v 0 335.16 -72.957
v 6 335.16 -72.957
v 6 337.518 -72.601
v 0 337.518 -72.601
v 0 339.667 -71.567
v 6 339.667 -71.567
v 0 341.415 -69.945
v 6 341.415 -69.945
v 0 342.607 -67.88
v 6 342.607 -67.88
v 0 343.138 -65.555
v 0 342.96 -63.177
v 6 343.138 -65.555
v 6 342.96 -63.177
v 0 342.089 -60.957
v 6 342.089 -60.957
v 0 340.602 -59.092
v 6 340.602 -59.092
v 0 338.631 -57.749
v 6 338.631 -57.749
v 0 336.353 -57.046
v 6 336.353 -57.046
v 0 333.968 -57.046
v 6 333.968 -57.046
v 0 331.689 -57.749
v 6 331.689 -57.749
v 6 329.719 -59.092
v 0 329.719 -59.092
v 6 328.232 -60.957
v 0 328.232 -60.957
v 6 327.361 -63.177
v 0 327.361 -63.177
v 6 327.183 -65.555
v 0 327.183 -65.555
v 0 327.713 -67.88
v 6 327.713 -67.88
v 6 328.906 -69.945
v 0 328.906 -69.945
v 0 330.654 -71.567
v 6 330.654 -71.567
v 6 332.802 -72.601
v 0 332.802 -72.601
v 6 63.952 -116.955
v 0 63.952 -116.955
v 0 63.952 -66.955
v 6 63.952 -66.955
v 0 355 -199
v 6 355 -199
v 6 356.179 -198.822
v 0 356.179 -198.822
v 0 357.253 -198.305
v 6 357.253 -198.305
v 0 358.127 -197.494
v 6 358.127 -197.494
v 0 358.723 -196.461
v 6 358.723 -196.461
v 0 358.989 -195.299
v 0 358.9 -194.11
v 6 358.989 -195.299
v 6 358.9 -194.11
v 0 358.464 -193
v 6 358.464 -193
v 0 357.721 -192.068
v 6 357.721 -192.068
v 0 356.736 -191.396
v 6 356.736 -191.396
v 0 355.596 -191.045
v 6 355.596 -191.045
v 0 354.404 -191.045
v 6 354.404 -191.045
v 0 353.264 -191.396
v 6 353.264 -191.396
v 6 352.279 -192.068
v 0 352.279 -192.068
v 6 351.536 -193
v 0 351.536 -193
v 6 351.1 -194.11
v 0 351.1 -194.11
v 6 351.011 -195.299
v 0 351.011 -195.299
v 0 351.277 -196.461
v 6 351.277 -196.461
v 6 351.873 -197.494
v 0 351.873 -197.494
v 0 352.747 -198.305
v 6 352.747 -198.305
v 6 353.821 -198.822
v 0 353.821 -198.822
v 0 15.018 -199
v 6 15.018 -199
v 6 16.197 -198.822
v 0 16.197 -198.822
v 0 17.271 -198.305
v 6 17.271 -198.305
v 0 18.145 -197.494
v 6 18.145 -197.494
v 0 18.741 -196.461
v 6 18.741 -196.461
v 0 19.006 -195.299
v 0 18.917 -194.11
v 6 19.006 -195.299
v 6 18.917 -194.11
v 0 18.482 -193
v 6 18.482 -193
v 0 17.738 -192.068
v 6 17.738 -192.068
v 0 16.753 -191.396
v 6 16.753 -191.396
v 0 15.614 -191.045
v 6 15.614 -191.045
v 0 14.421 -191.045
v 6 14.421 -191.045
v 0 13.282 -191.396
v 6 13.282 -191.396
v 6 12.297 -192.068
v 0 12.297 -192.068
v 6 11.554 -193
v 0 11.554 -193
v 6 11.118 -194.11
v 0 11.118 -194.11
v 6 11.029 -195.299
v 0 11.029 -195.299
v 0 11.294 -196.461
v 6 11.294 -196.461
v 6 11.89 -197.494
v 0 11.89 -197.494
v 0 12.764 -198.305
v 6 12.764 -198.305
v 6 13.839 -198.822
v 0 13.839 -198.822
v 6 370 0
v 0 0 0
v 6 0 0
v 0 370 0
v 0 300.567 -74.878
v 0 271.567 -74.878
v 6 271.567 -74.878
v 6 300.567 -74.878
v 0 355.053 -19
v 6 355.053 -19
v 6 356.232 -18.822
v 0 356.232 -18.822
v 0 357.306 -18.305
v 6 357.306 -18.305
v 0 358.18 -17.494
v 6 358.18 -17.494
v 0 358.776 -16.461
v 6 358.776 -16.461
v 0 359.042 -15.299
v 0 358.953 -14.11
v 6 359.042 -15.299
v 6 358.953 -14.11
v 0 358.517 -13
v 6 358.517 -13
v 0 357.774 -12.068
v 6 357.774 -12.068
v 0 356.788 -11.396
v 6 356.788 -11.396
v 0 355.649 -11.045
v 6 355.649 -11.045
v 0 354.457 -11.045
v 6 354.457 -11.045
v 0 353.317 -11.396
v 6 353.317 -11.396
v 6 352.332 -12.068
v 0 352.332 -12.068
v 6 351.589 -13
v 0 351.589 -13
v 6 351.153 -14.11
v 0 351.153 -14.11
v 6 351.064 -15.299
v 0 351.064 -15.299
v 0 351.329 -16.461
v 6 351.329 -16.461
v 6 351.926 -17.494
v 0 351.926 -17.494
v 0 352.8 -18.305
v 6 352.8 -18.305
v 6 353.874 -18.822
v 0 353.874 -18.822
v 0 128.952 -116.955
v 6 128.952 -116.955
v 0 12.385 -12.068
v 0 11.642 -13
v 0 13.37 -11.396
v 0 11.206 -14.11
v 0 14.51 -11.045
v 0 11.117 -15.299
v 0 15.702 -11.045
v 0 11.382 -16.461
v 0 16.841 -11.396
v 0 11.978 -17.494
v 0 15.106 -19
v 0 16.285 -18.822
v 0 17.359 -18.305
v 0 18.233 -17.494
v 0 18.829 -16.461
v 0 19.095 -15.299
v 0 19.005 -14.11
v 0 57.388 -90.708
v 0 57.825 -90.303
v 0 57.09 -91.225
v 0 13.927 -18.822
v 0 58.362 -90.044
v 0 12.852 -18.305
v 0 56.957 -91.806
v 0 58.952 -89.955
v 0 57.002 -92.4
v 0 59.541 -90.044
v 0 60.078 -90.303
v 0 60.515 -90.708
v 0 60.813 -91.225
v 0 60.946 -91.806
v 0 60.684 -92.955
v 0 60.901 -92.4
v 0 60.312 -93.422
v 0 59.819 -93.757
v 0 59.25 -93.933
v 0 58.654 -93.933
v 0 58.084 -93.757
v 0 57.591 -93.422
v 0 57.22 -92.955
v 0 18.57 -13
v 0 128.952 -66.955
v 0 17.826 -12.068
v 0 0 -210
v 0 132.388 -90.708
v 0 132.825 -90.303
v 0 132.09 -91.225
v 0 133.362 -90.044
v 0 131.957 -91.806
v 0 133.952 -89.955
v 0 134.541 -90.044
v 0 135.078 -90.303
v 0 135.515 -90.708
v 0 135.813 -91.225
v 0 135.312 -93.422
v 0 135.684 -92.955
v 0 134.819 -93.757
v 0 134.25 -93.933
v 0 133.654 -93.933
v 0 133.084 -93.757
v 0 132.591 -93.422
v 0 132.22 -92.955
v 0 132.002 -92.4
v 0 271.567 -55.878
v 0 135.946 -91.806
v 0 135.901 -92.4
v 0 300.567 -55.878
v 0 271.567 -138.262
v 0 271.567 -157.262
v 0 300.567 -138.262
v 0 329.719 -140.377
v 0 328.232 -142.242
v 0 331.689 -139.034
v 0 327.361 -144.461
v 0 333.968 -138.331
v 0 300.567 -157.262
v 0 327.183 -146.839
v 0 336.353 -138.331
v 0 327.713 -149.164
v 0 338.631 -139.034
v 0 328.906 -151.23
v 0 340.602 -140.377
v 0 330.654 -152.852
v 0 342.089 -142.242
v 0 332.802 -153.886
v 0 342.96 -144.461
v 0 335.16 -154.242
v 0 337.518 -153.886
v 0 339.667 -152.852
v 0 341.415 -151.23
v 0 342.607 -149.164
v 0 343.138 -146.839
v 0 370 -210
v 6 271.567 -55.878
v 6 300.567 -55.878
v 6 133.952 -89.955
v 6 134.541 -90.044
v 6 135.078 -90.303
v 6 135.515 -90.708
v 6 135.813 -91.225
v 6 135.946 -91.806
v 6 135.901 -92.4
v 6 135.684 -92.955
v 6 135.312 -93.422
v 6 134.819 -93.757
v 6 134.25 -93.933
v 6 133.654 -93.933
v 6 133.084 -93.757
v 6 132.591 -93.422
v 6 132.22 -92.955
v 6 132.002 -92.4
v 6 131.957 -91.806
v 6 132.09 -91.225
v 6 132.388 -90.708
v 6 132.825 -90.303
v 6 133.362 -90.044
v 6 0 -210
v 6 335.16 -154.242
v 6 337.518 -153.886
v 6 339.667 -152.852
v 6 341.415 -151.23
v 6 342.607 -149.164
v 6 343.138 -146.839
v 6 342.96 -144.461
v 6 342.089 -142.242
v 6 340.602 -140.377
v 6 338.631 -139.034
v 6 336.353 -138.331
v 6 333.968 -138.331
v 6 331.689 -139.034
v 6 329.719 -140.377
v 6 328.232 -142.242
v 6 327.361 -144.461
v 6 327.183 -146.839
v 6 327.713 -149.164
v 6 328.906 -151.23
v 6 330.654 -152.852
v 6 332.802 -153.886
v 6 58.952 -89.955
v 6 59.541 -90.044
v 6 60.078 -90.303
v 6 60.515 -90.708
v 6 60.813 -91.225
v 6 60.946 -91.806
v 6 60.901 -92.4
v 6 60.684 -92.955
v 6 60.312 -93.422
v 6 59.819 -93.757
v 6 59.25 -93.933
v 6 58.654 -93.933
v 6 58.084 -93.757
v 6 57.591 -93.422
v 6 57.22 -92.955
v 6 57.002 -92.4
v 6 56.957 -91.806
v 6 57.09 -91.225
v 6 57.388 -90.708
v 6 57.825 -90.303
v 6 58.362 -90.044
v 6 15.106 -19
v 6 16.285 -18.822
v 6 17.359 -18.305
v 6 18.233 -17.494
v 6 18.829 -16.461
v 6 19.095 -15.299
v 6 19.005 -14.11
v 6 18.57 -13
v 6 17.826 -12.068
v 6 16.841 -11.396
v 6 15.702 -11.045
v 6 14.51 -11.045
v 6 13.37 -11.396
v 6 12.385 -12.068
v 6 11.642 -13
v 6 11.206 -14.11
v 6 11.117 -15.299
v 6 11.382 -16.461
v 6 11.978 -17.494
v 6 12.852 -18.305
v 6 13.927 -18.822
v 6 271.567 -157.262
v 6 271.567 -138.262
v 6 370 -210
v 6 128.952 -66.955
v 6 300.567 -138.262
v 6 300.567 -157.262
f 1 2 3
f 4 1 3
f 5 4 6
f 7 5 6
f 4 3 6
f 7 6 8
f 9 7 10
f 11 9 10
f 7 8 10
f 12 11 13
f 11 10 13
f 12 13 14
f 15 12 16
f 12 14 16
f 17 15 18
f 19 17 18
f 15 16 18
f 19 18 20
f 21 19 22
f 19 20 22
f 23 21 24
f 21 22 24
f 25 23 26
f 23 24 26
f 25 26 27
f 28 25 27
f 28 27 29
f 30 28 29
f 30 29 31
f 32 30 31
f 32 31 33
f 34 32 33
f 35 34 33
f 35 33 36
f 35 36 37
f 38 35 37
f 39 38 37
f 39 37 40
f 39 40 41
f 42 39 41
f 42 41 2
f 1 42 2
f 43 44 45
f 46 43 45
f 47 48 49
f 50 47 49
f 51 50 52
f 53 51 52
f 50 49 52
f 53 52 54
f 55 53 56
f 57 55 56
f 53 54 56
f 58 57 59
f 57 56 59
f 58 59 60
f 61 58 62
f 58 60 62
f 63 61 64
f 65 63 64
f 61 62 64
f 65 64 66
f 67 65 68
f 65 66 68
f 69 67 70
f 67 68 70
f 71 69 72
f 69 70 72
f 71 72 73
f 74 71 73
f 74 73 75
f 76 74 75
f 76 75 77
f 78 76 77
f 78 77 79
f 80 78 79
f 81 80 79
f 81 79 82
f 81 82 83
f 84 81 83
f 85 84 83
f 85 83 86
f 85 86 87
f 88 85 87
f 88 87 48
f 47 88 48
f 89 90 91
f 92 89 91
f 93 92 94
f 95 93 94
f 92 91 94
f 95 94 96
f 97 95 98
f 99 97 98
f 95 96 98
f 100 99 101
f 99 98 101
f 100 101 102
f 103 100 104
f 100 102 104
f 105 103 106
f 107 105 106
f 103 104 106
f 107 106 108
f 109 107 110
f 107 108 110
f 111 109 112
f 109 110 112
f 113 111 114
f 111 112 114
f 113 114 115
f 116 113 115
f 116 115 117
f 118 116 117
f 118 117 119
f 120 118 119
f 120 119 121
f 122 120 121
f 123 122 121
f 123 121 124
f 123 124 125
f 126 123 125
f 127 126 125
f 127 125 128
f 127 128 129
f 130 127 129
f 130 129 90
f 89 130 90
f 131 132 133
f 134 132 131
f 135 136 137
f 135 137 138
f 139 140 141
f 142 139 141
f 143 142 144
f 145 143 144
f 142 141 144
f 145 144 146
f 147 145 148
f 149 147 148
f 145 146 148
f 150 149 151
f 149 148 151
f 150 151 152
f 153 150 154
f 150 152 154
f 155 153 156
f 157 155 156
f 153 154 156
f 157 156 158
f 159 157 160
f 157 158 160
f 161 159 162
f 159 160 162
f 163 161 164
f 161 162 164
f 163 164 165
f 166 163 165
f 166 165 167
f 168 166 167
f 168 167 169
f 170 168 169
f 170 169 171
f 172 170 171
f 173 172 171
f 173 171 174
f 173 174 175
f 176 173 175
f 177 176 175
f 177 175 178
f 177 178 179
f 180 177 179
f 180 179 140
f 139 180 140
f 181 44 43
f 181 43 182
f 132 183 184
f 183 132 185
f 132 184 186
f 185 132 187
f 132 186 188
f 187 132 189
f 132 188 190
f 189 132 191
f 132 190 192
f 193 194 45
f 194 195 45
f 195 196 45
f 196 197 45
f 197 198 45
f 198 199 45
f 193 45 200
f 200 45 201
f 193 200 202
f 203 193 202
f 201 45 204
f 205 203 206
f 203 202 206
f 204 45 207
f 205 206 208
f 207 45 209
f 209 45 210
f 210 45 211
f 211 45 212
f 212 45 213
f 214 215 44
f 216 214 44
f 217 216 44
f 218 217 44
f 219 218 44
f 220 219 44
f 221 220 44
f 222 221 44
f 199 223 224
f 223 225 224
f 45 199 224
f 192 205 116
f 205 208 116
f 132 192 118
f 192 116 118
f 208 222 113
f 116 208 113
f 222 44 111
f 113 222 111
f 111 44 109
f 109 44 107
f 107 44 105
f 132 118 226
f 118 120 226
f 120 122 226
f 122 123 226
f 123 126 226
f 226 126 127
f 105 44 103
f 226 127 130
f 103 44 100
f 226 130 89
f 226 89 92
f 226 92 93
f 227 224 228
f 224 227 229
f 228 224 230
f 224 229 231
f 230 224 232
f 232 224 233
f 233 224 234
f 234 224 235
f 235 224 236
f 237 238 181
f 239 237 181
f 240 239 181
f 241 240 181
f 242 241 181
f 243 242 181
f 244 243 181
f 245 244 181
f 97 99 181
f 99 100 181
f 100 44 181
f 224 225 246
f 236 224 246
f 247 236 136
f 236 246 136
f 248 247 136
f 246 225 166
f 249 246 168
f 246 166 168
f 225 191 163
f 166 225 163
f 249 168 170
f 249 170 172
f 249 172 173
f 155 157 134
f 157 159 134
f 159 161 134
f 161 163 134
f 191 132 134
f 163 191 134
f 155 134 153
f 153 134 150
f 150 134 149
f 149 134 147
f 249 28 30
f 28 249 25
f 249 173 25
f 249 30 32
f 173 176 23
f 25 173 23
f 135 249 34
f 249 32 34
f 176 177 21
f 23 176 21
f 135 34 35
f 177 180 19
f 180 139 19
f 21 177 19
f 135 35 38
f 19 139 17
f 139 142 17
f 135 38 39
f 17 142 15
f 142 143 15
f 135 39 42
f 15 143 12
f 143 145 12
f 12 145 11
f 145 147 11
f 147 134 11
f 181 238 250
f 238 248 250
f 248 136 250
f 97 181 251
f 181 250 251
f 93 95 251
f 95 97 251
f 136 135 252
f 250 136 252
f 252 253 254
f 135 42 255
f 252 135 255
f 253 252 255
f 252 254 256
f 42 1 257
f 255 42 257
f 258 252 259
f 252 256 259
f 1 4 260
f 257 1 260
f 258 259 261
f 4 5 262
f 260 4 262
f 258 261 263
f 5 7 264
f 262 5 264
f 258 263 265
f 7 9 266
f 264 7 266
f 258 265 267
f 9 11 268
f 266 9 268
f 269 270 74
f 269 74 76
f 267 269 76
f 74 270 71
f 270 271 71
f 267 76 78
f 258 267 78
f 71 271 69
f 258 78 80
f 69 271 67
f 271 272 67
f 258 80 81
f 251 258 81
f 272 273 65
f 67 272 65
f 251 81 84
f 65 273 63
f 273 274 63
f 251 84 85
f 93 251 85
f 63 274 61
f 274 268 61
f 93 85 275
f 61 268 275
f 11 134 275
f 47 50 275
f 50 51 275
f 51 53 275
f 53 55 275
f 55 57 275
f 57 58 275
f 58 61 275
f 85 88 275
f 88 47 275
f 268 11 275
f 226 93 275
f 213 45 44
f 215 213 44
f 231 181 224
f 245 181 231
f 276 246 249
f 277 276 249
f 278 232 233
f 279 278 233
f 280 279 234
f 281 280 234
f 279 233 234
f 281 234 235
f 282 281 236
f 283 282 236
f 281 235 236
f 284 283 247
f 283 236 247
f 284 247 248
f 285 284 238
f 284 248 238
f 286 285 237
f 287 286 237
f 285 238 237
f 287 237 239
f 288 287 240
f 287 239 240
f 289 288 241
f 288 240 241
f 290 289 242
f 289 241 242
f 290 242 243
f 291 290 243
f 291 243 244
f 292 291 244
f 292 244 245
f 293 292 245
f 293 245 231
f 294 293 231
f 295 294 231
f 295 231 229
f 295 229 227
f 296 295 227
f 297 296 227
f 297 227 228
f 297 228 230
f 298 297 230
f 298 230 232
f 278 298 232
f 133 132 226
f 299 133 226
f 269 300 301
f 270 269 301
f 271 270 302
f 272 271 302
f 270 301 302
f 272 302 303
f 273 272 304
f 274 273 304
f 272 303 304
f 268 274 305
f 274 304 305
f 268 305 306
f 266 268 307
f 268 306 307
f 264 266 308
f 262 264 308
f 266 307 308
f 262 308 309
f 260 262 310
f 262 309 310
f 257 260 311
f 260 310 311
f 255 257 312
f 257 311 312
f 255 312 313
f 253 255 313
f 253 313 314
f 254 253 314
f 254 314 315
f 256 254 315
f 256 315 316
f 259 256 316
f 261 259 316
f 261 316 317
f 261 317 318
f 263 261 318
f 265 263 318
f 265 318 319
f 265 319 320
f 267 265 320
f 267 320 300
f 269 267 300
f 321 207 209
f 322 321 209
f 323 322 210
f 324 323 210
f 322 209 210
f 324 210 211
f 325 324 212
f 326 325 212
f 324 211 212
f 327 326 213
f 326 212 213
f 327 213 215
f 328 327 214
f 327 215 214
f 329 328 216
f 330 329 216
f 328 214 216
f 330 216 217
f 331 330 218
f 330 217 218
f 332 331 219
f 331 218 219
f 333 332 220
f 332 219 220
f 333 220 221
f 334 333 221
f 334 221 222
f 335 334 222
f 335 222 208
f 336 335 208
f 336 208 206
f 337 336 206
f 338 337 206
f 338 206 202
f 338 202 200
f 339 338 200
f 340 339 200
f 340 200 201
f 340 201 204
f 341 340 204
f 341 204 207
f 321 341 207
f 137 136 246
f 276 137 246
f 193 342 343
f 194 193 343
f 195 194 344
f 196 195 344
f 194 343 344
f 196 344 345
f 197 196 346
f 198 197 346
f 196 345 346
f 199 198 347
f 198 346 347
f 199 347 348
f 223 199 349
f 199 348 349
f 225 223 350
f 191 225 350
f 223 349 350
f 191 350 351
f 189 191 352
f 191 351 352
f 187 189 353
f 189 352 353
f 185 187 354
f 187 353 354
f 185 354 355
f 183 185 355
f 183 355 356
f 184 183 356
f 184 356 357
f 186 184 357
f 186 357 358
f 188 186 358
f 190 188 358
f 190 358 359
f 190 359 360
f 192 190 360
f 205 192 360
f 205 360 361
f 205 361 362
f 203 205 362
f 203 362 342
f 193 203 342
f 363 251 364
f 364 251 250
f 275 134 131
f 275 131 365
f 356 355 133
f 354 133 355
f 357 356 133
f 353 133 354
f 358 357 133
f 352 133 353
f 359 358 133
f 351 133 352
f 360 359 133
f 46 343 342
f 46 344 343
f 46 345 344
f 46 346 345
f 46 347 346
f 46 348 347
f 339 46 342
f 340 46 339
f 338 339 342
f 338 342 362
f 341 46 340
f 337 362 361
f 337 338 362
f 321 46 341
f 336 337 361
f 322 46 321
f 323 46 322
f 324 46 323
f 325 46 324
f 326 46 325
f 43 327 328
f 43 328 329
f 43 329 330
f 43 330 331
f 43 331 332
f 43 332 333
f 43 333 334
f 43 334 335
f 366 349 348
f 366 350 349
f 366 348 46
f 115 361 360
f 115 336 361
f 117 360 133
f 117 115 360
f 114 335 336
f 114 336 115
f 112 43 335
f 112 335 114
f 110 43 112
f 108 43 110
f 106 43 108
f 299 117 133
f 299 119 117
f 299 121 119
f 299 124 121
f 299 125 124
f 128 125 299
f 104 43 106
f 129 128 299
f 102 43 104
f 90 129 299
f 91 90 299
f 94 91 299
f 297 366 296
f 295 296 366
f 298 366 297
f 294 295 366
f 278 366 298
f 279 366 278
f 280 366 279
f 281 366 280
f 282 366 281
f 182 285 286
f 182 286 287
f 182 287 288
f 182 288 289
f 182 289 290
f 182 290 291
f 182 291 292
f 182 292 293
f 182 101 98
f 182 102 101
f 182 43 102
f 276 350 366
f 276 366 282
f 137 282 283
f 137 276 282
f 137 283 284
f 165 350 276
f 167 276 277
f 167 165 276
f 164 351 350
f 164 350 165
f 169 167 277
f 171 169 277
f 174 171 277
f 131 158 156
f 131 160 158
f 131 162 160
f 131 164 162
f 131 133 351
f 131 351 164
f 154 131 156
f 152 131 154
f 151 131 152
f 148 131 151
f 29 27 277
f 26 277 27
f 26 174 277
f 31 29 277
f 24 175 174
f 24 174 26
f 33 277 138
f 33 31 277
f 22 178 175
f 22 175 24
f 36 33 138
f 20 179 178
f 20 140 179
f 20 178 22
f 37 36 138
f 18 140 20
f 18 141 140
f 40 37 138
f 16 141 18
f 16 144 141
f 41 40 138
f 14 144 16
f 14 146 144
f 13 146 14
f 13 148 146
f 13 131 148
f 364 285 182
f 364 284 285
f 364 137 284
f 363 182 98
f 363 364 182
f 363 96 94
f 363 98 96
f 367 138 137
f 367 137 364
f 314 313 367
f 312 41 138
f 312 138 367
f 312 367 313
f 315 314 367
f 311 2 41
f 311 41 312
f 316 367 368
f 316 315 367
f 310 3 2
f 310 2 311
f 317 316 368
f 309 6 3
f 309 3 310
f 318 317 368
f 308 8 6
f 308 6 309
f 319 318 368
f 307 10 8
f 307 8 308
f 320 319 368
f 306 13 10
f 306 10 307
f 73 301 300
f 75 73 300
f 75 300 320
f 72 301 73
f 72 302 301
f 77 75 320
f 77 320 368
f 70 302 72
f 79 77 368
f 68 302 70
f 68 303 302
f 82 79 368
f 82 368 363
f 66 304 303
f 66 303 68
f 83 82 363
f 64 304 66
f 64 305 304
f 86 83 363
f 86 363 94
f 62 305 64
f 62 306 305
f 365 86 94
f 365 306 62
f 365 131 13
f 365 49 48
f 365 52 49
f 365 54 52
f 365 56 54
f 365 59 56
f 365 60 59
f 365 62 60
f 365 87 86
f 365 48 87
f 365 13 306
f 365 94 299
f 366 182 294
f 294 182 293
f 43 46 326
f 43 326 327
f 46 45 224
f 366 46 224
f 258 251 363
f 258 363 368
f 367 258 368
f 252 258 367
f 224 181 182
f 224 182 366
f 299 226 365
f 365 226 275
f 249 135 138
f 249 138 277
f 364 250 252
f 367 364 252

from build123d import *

# Parameters (mm, degrees)
SKETCH1_W           = 210
SKETCH1_H           = 370
BOSS_EXTRUDE1_DEPTH = 6
SKETCH2_W           = 50
SKETCH2_H           = 65
SKETCH2_W_2         = 19
SKETCH2_H_2         = 29
CUT_EXTRUDE1_DEPTH  = 10
SKETCH3_R           = 2
CUT_EXTRUDE2_DEPTH  = 10
SKETCH4_R           = 8
CUT_EXTRUDE3_DEPTH  = 10
SKETCH5_R           = 4
CUT_EXTRUDE4_DEPTH  = 12


with BuildPart() as part:
    # Sketch1 → Boss-Extrude1 (new body)
    with BuildSketch(Plane(origin=(0, 0, 0), x_dir=(0, 0, -1), z_dir=(1, 0, 0))):
        with Locations((105, 185)):
            Rectangle(SKETCH1_W, SKETCH1_H)
    extrude(amount=BOSS_EXTRUDE1_DEPTH)

    # Sketch2 → Cut-Extrude1 (cut)
    with BuildSketch(Plane.ZY):
        with Locations((-91.955439439, 96.451615806)):
            Rectangle(SKETCH2_W, SKETCH2_H)
        with Locations((-147.762028201, 286.067321943)):
            Rectangle(SKETCH2_W_2, SKETCH2_H_2)
        with Locations((-65.37786445, 286.067321943)):
            Rectangle(SKETCH2_W_2, SKETCH2_H_2)
    extrude(amount=-CUT_EXTRUDE1_DEPTH, mode=Mode.SUBTRACT)

    # Sketch3 → Cut-Extrude2 (cut)
    with BuildSketch(Plane.ZY):
        with Locations((-91.955439439, 133.951615806)):
            Circle(SKETCH3_R)
        with Locations((-91.955439439, 58.951615806)):
            Circle(SKETCH3_R)
    extrude(amount=-CUT_EXTRUDE2_DEPTH, mode=Mode.SUBTRACT)

    # Sketch4 → Cut-Extrude3 (cut)
    with BuildSketch(Plane(origin=(6, 0, 0), x_dir=(0, 0, -1), z_dir=(1, 0, 0))):
        with Locations((146.241614862, 335.160418709)):
            Circle(SKETCH4_R)
        with Locations((64.956823424, 335.160418709)):
            Circle(SKETCH4_R)
    extrude(amount=-CUT_EXTRUDE3_DEPTH, mode=Mode.SUBTRACT)

    # Sketch5 → Cut-Extrude4 (cut)
    with BuildSketch(Plane(origin=(6, 0, 0), x_dir=(0, 0, -1), z_dir=(1, 0, 0))):
        with Locations((15.00004659, 15.105743091)):
            Circle(SKETCH5_R)
        with Locations((15.00009318, 355.052871545)):
            Circle(SKETCH5_R)
        with Locations((195.00004659, 355)):
            Circle(SKETCH5_R)
        with Locations((195, 15.017639421)):
            Circle(SKETCH5_R)
    extrude(amount=-CUT_EXTRUDE4_DEPTH, mode=Mode.SUBTRACT)


solid = part.part
